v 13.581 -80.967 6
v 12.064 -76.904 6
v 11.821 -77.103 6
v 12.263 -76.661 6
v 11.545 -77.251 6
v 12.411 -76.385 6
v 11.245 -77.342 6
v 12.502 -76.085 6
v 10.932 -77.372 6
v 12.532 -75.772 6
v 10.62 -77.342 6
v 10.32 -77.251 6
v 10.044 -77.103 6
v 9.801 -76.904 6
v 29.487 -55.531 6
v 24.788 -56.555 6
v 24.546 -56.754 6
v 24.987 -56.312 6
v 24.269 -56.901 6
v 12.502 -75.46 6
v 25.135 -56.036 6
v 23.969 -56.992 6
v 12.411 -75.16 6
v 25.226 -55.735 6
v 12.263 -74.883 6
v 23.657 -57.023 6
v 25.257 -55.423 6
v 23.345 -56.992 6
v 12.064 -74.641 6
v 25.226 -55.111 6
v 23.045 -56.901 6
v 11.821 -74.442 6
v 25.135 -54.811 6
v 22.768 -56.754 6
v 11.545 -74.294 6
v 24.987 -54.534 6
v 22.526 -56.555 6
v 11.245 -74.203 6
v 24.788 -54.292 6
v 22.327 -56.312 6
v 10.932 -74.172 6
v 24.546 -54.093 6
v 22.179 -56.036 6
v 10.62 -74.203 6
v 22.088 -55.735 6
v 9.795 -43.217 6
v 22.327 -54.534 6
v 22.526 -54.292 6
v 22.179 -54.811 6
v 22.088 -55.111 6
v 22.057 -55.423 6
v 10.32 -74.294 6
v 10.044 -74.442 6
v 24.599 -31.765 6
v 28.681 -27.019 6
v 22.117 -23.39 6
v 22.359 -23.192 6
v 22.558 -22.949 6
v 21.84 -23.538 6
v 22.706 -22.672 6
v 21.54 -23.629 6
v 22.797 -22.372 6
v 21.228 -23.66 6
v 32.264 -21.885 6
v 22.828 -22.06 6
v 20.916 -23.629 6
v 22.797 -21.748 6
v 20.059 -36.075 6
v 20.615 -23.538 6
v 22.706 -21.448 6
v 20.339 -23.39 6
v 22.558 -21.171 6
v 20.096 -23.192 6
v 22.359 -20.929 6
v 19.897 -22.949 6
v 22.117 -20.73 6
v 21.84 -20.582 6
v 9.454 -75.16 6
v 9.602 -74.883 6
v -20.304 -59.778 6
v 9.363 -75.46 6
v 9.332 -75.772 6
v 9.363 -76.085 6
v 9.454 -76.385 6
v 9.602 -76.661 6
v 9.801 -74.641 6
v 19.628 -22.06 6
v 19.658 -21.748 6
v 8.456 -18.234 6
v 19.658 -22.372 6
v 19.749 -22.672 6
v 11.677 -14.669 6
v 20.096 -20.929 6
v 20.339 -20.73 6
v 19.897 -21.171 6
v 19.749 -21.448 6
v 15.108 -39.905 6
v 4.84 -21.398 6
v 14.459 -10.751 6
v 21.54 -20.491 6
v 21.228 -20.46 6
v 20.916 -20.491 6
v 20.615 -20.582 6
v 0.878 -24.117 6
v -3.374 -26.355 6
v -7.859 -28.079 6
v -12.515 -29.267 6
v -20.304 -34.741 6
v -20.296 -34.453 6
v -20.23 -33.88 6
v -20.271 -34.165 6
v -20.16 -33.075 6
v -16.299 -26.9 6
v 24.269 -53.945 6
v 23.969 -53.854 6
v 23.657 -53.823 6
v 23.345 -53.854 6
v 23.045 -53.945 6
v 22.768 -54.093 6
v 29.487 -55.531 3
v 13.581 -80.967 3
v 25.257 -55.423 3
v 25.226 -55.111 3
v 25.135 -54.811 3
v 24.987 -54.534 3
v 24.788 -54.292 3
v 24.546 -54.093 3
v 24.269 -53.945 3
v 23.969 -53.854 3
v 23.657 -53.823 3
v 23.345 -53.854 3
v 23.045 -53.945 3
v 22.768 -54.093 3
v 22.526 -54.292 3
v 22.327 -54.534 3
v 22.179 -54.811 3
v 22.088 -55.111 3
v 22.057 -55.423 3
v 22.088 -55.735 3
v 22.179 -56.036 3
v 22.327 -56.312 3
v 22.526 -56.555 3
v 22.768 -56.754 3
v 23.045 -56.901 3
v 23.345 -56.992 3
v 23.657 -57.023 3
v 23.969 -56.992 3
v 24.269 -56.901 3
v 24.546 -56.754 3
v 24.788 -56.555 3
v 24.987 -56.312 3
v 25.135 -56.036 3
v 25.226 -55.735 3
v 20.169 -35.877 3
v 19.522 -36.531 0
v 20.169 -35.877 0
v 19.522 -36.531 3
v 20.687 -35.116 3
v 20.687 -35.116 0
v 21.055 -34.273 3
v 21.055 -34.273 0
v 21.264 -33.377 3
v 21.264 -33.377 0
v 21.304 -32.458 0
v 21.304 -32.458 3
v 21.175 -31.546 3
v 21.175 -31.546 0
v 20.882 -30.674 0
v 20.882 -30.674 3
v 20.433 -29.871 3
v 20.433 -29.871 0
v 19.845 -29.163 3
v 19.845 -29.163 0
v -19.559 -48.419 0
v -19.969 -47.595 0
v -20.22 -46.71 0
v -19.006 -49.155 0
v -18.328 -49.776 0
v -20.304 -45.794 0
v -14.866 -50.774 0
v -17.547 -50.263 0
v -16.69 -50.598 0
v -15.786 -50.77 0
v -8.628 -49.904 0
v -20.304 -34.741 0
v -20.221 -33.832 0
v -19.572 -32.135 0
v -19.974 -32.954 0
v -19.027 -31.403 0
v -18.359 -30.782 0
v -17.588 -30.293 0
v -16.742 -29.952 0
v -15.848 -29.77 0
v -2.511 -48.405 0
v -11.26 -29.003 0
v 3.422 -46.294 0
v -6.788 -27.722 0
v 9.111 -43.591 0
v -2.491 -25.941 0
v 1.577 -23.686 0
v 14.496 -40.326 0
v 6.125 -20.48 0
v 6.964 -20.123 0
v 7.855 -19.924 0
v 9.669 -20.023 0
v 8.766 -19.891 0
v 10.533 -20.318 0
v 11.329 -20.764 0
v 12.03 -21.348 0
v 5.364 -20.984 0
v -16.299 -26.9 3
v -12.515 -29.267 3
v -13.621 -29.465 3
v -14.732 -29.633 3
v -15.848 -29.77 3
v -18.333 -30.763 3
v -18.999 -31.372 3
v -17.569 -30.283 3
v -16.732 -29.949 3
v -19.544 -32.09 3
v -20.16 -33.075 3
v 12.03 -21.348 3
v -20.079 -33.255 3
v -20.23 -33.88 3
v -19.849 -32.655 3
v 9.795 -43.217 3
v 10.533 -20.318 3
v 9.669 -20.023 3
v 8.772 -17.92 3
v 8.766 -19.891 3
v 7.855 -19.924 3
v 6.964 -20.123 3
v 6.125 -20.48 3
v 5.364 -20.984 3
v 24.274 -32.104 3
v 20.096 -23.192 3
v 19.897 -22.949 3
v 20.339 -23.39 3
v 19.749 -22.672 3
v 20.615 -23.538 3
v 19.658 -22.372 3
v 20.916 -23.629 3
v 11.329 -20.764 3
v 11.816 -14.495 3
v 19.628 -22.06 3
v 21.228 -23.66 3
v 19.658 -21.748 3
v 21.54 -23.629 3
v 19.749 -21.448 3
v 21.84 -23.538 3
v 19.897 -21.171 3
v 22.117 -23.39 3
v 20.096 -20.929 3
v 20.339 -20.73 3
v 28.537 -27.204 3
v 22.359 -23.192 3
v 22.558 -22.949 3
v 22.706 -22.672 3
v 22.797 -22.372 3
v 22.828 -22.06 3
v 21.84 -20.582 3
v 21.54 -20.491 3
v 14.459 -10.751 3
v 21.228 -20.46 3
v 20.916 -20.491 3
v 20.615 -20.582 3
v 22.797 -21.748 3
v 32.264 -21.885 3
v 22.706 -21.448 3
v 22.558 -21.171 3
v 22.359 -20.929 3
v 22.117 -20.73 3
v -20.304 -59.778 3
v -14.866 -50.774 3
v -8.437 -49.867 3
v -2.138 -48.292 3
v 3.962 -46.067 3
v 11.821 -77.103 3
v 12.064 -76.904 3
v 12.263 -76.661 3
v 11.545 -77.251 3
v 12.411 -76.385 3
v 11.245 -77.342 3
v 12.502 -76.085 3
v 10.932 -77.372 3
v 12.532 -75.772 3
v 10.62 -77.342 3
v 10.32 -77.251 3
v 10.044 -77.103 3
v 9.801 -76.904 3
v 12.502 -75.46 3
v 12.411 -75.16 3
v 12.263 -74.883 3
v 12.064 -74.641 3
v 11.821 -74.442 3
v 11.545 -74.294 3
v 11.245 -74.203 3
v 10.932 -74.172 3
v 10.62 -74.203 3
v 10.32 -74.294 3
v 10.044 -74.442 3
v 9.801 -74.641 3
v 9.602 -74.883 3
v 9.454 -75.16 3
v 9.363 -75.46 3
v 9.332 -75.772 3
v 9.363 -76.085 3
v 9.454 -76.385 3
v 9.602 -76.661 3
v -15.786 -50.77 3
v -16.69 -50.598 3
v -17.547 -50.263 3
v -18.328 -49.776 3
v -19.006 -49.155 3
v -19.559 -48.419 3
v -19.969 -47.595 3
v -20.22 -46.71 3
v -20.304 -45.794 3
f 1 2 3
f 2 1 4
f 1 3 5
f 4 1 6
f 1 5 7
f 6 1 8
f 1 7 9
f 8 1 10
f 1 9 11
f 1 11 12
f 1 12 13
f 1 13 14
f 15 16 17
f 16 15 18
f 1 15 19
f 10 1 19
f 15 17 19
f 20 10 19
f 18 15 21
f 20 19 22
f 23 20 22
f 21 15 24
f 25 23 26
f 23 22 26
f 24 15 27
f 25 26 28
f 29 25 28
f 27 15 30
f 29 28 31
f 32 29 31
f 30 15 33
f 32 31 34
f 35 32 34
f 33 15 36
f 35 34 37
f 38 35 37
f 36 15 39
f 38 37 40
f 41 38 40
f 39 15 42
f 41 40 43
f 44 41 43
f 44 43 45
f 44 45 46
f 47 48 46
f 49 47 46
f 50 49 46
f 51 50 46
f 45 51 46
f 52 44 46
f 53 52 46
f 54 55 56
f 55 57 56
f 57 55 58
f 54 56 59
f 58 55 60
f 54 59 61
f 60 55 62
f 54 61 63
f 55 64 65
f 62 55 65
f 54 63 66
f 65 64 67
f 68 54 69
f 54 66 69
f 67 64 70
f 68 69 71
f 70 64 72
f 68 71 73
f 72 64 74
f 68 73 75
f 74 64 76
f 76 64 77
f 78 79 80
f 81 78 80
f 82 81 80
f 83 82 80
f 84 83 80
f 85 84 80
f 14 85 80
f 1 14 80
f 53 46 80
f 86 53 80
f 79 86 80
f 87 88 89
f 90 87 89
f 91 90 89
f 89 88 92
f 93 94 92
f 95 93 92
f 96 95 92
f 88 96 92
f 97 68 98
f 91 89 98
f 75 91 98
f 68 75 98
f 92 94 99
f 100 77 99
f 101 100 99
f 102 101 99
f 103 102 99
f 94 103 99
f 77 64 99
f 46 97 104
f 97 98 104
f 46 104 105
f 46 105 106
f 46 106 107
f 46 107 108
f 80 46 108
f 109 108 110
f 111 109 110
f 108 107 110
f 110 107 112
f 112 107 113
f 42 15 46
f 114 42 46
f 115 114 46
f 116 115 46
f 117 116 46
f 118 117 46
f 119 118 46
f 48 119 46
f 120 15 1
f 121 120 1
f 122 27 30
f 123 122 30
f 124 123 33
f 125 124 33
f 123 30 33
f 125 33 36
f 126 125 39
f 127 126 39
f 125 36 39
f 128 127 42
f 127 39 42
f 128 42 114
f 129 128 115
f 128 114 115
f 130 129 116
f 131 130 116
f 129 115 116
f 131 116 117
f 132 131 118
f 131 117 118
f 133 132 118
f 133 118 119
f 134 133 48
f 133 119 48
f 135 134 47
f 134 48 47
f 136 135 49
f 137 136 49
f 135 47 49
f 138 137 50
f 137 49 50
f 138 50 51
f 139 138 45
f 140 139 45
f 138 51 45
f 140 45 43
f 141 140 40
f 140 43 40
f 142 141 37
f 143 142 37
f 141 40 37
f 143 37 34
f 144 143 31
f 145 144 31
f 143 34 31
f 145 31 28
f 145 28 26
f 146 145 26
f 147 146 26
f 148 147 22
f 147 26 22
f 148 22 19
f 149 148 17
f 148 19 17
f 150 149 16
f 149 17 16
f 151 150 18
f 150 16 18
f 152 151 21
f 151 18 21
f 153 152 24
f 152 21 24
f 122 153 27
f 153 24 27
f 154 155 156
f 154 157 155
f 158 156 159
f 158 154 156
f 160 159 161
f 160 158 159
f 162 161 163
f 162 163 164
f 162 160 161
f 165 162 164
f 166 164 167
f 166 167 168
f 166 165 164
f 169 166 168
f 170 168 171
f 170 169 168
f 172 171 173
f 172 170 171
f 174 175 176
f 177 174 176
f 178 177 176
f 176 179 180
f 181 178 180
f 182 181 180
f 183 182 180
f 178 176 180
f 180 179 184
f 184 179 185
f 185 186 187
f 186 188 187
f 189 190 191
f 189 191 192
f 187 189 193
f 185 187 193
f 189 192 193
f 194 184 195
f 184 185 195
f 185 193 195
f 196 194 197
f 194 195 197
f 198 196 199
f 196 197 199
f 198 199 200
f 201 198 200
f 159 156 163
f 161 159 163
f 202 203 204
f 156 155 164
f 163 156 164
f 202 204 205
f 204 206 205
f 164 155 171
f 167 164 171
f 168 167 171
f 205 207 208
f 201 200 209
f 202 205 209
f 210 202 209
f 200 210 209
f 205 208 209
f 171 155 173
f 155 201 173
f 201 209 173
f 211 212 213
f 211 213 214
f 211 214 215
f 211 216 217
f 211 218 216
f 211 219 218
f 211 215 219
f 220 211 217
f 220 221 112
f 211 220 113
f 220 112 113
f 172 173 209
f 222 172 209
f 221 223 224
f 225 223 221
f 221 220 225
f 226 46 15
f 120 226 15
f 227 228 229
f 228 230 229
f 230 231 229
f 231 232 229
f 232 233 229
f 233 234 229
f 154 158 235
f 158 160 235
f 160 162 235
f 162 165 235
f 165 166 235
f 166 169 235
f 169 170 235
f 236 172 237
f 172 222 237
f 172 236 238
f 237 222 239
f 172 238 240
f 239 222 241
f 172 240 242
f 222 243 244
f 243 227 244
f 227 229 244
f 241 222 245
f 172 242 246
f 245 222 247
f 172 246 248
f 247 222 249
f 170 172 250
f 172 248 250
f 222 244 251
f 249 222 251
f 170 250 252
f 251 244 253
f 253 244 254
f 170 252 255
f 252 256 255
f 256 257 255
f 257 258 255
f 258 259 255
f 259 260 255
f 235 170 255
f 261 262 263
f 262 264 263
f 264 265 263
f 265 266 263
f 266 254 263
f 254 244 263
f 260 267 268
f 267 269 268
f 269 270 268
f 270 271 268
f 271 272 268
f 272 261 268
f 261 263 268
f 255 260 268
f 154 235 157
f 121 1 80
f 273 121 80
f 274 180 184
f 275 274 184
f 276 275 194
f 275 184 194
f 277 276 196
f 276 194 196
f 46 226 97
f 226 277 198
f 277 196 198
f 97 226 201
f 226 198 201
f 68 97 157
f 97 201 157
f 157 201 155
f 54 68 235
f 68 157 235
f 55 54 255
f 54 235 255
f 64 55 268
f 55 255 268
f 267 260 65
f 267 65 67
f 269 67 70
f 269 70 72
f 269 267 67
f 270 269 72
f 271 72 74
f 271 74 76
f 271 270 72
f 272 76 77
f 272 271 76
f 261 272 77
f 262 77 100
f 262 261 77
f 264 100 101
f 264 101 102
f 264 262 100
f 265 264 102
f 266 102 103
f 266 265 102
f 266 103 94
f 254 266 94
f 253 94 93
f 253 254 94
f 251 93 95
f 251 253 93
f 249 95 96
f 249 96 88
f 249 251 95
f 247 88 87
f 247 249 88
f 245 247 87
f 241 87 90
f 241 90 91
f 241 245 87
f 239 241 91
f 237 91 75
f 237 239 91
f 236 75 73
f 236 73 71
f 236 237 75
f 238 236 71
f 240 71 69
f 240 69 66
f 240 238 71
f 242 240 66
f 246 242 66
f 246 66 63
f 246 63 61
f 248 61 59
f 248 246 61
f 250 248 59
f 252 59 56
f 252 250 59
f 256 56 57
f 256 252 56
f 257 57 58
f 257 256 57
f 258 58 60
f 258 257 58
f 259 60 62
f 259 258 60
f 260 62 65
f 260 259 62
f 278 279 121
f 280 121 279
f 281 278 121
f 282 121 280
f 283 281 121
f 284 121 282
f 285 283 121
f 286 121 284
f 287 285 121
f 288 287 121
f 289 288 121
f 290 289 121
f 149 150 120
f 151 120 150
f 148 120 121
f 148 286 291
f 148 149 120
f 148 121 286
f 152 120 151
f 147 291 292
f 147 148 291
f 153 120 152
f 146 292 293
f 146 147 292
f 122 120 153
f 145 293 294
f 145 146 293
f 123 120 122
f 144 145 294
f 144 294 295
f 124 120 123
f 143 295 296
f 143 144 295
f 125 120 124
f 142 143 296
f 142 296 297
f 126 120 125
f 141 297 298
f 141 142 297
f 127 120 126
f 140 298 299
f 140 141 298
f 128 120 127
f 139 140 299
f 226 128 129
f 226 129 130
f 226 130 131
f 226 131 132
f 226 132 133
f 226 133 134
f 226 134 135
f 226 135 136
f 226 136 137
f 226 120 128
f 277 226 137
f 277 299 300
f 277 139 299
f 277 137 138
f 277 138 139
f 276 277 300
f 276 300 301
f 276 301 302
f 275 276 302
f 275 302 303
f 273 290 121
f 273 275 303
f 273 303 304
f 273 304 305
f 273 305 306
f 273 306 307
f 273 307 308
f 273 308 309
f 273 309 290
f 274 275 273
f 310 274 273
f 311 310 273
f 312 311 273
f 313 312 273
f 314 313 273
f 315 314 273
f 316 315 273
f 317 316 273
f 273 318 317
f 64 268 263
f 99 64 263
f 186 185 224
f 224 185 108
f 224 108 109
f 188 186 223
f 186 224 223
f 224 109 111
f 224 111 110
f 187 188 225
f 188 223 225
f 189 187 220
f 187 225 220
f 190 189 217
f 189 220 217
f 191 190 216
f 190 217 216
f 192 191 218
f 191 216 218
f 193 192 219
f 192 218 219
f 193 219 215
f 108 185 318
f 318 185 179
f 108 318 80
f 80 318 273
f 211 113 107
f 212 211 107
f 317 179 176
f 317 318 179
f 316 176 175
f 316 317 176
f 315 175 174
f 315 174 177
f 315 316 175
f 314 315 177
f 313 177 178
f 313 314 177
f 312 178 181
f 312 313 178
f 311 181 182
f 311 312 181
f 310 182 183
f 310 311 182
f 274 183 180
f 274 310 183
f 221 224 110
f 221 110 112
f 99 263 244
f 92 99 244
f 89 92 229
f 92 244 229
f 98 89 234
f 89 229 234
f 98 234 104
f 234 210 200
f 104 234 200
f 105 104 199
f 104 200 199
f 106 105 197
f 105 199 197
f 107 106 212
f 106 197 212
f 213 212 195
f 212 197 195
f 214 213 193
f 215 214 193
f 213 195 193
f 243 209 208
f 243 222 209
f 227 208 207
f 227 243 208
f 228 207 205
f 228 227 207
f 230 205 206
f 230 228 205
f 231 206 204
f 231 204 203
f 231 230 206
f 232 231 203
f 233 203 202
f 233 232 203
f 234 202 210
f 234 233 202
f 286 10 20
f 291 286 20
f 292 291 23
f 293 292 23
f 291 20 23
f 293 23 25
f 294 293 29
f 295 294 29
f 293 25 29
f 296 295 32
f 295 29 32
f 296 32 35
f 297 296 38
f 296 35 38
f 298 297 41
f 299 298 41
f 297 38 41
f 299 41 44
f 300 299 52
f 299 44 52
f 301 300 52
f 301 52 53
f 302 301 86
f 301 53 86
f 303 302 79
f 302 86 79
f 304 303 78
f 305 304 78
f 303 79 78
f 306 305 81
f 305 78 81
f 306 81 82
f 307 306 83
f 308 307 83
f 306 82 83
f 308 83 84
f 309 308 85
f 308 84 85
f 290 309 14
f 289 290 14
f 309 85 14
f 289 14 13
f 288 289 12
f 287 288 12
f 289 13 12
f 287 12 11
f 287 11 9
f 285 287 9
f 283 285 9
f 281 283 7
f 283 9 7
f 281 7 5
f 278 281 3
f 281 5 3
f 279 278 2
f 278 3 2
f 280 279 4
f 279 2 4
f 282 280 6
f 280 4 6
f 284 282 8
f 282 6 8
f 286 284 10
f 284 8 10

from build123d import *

# Parameters (mm, degrees)
EXTRUDE_1_DEPTH = 3
FILLET_1_R      = 5
SKETCH_2_R      = 1.6000000000000019
EXTRUDE_2_DEPTH = 3
FILLET_2_R      = 5
SKETCH_3_R      = 1.6000000000000008
SKETCH_3_R_2    = 1.6000000000000012
EXTRUDE_3_DEPTH = 3


with BuildPart() as part:
    # 草图1 → 凸台-拉伸1 (new body)
    with BuildSketch(Plane.XY):
        with BuildLine():
            Line((-20.304339314515776, -30.013405439405844), (-20.304339314515772, -51.013405439405844))
            ThreePointArc((-20.304339314515772, -51.013405439405844), (3.4220334921198514, -46.293936455105595), (23.536281119050262, -32.854025872971704))
            Line((23.536281119050262, -32.854025872971704), (8.687038714132733, -18.00478346805423))
            ThreePointArc((8.687038714132733, -18.00478346805423), (-4.614318587547064, -26.892466272368587), (-20.304339314515776, -30.013405439405844))
        make_face()
    extrude(amount=EXTRUDE_1_DEPTH)

    # 圆角1
    fillet_1_edges = [part.edges().sort_by_distance(p)[0] for p in [
        (8.687038714132733, -18.004783468054235, 1.5),
        (23.53628111905026, -32.854025872971704, 1.5),
        (-20.304339314515772, -51.013405439405844, 1.5),
        (-20.304339314515772, -30.013405439405844, 1.5),
    ]]
    fillet(fillet_1_edges, radius=FILLET_1_R)

    # 草图2 → 凸台-拉伸2 (add)
    with BuildSketch(Plane.XY.offset(3)):
        with BuildLine():
            Line((-20.30433931451578, -30.013405439405844), (-20.30433931451578, -51.013405439405865))
            ThreePointArc((-20.30433931451578, -51.013405439405865), (9.745319415064024, -43.24455894212779), (32.26429472639552, -21.884954156689382))
            Line((32.26429472639552, -21.884954156689382), (14.45878964802233, -10.751042494383663))
            ThreePointArc((14.45878964802233, -10.751042494383663), (-0.43279079979365775, -24.87594243314131), (-20.30433931451578, -30.013405439405844))
        make_face()
        with Locations((21.227676100740037, -22.06013948042292)):
            Circle(SKETCH_2_R, mode=Mode.SUBTRACT)
    extrude(amount=EXTRUDE_2_DEPTH)

    # 圆角2
    fillet_2_edges = [part.edges().sort_by_distance(p)[0] for p in [
        (-20.30433931451578, -30.013405439405844, 4.5),
        (-20.30433931451578, -51.01340543940586, 4.5),
    ]]
    fillet(fillet_2_edges, radius=FILLET_2_R)

    # 草图3 → 凸台-拉伸3 (add)
    with BuildSketch(Plane.XY.offset(6)):
        Polygon((-16.298731474091507, -26.90045671258201), (29.48685301315381, -55.53051527279668), (13.581264924145668, -80.96695109904408), (-20.30433931451578, -59.778036628128184), (-20.30433931451578, -34.74085890010055), (-20.159852559425826, -33.075214801052134), align=None)
        with Locations((-13.649884311951084, -32.09503164337476)):
            Circle(SKETCH_3_R, mode=Mode.SUBTRACT)
        with Locations((23.656888233211756, -55.42322750725339)):
            Circle(SKETCH_3_R, mode=Mode.SUBTRACT)
        with Locations((10.932417762005228, -75.7723761682513)):
            Circle(SKETCH_3_R_2, mode=Mode.SUBTRACT)
    extrude(amount=-EXTRUDE_3_DEPTH)


solid = part.part
